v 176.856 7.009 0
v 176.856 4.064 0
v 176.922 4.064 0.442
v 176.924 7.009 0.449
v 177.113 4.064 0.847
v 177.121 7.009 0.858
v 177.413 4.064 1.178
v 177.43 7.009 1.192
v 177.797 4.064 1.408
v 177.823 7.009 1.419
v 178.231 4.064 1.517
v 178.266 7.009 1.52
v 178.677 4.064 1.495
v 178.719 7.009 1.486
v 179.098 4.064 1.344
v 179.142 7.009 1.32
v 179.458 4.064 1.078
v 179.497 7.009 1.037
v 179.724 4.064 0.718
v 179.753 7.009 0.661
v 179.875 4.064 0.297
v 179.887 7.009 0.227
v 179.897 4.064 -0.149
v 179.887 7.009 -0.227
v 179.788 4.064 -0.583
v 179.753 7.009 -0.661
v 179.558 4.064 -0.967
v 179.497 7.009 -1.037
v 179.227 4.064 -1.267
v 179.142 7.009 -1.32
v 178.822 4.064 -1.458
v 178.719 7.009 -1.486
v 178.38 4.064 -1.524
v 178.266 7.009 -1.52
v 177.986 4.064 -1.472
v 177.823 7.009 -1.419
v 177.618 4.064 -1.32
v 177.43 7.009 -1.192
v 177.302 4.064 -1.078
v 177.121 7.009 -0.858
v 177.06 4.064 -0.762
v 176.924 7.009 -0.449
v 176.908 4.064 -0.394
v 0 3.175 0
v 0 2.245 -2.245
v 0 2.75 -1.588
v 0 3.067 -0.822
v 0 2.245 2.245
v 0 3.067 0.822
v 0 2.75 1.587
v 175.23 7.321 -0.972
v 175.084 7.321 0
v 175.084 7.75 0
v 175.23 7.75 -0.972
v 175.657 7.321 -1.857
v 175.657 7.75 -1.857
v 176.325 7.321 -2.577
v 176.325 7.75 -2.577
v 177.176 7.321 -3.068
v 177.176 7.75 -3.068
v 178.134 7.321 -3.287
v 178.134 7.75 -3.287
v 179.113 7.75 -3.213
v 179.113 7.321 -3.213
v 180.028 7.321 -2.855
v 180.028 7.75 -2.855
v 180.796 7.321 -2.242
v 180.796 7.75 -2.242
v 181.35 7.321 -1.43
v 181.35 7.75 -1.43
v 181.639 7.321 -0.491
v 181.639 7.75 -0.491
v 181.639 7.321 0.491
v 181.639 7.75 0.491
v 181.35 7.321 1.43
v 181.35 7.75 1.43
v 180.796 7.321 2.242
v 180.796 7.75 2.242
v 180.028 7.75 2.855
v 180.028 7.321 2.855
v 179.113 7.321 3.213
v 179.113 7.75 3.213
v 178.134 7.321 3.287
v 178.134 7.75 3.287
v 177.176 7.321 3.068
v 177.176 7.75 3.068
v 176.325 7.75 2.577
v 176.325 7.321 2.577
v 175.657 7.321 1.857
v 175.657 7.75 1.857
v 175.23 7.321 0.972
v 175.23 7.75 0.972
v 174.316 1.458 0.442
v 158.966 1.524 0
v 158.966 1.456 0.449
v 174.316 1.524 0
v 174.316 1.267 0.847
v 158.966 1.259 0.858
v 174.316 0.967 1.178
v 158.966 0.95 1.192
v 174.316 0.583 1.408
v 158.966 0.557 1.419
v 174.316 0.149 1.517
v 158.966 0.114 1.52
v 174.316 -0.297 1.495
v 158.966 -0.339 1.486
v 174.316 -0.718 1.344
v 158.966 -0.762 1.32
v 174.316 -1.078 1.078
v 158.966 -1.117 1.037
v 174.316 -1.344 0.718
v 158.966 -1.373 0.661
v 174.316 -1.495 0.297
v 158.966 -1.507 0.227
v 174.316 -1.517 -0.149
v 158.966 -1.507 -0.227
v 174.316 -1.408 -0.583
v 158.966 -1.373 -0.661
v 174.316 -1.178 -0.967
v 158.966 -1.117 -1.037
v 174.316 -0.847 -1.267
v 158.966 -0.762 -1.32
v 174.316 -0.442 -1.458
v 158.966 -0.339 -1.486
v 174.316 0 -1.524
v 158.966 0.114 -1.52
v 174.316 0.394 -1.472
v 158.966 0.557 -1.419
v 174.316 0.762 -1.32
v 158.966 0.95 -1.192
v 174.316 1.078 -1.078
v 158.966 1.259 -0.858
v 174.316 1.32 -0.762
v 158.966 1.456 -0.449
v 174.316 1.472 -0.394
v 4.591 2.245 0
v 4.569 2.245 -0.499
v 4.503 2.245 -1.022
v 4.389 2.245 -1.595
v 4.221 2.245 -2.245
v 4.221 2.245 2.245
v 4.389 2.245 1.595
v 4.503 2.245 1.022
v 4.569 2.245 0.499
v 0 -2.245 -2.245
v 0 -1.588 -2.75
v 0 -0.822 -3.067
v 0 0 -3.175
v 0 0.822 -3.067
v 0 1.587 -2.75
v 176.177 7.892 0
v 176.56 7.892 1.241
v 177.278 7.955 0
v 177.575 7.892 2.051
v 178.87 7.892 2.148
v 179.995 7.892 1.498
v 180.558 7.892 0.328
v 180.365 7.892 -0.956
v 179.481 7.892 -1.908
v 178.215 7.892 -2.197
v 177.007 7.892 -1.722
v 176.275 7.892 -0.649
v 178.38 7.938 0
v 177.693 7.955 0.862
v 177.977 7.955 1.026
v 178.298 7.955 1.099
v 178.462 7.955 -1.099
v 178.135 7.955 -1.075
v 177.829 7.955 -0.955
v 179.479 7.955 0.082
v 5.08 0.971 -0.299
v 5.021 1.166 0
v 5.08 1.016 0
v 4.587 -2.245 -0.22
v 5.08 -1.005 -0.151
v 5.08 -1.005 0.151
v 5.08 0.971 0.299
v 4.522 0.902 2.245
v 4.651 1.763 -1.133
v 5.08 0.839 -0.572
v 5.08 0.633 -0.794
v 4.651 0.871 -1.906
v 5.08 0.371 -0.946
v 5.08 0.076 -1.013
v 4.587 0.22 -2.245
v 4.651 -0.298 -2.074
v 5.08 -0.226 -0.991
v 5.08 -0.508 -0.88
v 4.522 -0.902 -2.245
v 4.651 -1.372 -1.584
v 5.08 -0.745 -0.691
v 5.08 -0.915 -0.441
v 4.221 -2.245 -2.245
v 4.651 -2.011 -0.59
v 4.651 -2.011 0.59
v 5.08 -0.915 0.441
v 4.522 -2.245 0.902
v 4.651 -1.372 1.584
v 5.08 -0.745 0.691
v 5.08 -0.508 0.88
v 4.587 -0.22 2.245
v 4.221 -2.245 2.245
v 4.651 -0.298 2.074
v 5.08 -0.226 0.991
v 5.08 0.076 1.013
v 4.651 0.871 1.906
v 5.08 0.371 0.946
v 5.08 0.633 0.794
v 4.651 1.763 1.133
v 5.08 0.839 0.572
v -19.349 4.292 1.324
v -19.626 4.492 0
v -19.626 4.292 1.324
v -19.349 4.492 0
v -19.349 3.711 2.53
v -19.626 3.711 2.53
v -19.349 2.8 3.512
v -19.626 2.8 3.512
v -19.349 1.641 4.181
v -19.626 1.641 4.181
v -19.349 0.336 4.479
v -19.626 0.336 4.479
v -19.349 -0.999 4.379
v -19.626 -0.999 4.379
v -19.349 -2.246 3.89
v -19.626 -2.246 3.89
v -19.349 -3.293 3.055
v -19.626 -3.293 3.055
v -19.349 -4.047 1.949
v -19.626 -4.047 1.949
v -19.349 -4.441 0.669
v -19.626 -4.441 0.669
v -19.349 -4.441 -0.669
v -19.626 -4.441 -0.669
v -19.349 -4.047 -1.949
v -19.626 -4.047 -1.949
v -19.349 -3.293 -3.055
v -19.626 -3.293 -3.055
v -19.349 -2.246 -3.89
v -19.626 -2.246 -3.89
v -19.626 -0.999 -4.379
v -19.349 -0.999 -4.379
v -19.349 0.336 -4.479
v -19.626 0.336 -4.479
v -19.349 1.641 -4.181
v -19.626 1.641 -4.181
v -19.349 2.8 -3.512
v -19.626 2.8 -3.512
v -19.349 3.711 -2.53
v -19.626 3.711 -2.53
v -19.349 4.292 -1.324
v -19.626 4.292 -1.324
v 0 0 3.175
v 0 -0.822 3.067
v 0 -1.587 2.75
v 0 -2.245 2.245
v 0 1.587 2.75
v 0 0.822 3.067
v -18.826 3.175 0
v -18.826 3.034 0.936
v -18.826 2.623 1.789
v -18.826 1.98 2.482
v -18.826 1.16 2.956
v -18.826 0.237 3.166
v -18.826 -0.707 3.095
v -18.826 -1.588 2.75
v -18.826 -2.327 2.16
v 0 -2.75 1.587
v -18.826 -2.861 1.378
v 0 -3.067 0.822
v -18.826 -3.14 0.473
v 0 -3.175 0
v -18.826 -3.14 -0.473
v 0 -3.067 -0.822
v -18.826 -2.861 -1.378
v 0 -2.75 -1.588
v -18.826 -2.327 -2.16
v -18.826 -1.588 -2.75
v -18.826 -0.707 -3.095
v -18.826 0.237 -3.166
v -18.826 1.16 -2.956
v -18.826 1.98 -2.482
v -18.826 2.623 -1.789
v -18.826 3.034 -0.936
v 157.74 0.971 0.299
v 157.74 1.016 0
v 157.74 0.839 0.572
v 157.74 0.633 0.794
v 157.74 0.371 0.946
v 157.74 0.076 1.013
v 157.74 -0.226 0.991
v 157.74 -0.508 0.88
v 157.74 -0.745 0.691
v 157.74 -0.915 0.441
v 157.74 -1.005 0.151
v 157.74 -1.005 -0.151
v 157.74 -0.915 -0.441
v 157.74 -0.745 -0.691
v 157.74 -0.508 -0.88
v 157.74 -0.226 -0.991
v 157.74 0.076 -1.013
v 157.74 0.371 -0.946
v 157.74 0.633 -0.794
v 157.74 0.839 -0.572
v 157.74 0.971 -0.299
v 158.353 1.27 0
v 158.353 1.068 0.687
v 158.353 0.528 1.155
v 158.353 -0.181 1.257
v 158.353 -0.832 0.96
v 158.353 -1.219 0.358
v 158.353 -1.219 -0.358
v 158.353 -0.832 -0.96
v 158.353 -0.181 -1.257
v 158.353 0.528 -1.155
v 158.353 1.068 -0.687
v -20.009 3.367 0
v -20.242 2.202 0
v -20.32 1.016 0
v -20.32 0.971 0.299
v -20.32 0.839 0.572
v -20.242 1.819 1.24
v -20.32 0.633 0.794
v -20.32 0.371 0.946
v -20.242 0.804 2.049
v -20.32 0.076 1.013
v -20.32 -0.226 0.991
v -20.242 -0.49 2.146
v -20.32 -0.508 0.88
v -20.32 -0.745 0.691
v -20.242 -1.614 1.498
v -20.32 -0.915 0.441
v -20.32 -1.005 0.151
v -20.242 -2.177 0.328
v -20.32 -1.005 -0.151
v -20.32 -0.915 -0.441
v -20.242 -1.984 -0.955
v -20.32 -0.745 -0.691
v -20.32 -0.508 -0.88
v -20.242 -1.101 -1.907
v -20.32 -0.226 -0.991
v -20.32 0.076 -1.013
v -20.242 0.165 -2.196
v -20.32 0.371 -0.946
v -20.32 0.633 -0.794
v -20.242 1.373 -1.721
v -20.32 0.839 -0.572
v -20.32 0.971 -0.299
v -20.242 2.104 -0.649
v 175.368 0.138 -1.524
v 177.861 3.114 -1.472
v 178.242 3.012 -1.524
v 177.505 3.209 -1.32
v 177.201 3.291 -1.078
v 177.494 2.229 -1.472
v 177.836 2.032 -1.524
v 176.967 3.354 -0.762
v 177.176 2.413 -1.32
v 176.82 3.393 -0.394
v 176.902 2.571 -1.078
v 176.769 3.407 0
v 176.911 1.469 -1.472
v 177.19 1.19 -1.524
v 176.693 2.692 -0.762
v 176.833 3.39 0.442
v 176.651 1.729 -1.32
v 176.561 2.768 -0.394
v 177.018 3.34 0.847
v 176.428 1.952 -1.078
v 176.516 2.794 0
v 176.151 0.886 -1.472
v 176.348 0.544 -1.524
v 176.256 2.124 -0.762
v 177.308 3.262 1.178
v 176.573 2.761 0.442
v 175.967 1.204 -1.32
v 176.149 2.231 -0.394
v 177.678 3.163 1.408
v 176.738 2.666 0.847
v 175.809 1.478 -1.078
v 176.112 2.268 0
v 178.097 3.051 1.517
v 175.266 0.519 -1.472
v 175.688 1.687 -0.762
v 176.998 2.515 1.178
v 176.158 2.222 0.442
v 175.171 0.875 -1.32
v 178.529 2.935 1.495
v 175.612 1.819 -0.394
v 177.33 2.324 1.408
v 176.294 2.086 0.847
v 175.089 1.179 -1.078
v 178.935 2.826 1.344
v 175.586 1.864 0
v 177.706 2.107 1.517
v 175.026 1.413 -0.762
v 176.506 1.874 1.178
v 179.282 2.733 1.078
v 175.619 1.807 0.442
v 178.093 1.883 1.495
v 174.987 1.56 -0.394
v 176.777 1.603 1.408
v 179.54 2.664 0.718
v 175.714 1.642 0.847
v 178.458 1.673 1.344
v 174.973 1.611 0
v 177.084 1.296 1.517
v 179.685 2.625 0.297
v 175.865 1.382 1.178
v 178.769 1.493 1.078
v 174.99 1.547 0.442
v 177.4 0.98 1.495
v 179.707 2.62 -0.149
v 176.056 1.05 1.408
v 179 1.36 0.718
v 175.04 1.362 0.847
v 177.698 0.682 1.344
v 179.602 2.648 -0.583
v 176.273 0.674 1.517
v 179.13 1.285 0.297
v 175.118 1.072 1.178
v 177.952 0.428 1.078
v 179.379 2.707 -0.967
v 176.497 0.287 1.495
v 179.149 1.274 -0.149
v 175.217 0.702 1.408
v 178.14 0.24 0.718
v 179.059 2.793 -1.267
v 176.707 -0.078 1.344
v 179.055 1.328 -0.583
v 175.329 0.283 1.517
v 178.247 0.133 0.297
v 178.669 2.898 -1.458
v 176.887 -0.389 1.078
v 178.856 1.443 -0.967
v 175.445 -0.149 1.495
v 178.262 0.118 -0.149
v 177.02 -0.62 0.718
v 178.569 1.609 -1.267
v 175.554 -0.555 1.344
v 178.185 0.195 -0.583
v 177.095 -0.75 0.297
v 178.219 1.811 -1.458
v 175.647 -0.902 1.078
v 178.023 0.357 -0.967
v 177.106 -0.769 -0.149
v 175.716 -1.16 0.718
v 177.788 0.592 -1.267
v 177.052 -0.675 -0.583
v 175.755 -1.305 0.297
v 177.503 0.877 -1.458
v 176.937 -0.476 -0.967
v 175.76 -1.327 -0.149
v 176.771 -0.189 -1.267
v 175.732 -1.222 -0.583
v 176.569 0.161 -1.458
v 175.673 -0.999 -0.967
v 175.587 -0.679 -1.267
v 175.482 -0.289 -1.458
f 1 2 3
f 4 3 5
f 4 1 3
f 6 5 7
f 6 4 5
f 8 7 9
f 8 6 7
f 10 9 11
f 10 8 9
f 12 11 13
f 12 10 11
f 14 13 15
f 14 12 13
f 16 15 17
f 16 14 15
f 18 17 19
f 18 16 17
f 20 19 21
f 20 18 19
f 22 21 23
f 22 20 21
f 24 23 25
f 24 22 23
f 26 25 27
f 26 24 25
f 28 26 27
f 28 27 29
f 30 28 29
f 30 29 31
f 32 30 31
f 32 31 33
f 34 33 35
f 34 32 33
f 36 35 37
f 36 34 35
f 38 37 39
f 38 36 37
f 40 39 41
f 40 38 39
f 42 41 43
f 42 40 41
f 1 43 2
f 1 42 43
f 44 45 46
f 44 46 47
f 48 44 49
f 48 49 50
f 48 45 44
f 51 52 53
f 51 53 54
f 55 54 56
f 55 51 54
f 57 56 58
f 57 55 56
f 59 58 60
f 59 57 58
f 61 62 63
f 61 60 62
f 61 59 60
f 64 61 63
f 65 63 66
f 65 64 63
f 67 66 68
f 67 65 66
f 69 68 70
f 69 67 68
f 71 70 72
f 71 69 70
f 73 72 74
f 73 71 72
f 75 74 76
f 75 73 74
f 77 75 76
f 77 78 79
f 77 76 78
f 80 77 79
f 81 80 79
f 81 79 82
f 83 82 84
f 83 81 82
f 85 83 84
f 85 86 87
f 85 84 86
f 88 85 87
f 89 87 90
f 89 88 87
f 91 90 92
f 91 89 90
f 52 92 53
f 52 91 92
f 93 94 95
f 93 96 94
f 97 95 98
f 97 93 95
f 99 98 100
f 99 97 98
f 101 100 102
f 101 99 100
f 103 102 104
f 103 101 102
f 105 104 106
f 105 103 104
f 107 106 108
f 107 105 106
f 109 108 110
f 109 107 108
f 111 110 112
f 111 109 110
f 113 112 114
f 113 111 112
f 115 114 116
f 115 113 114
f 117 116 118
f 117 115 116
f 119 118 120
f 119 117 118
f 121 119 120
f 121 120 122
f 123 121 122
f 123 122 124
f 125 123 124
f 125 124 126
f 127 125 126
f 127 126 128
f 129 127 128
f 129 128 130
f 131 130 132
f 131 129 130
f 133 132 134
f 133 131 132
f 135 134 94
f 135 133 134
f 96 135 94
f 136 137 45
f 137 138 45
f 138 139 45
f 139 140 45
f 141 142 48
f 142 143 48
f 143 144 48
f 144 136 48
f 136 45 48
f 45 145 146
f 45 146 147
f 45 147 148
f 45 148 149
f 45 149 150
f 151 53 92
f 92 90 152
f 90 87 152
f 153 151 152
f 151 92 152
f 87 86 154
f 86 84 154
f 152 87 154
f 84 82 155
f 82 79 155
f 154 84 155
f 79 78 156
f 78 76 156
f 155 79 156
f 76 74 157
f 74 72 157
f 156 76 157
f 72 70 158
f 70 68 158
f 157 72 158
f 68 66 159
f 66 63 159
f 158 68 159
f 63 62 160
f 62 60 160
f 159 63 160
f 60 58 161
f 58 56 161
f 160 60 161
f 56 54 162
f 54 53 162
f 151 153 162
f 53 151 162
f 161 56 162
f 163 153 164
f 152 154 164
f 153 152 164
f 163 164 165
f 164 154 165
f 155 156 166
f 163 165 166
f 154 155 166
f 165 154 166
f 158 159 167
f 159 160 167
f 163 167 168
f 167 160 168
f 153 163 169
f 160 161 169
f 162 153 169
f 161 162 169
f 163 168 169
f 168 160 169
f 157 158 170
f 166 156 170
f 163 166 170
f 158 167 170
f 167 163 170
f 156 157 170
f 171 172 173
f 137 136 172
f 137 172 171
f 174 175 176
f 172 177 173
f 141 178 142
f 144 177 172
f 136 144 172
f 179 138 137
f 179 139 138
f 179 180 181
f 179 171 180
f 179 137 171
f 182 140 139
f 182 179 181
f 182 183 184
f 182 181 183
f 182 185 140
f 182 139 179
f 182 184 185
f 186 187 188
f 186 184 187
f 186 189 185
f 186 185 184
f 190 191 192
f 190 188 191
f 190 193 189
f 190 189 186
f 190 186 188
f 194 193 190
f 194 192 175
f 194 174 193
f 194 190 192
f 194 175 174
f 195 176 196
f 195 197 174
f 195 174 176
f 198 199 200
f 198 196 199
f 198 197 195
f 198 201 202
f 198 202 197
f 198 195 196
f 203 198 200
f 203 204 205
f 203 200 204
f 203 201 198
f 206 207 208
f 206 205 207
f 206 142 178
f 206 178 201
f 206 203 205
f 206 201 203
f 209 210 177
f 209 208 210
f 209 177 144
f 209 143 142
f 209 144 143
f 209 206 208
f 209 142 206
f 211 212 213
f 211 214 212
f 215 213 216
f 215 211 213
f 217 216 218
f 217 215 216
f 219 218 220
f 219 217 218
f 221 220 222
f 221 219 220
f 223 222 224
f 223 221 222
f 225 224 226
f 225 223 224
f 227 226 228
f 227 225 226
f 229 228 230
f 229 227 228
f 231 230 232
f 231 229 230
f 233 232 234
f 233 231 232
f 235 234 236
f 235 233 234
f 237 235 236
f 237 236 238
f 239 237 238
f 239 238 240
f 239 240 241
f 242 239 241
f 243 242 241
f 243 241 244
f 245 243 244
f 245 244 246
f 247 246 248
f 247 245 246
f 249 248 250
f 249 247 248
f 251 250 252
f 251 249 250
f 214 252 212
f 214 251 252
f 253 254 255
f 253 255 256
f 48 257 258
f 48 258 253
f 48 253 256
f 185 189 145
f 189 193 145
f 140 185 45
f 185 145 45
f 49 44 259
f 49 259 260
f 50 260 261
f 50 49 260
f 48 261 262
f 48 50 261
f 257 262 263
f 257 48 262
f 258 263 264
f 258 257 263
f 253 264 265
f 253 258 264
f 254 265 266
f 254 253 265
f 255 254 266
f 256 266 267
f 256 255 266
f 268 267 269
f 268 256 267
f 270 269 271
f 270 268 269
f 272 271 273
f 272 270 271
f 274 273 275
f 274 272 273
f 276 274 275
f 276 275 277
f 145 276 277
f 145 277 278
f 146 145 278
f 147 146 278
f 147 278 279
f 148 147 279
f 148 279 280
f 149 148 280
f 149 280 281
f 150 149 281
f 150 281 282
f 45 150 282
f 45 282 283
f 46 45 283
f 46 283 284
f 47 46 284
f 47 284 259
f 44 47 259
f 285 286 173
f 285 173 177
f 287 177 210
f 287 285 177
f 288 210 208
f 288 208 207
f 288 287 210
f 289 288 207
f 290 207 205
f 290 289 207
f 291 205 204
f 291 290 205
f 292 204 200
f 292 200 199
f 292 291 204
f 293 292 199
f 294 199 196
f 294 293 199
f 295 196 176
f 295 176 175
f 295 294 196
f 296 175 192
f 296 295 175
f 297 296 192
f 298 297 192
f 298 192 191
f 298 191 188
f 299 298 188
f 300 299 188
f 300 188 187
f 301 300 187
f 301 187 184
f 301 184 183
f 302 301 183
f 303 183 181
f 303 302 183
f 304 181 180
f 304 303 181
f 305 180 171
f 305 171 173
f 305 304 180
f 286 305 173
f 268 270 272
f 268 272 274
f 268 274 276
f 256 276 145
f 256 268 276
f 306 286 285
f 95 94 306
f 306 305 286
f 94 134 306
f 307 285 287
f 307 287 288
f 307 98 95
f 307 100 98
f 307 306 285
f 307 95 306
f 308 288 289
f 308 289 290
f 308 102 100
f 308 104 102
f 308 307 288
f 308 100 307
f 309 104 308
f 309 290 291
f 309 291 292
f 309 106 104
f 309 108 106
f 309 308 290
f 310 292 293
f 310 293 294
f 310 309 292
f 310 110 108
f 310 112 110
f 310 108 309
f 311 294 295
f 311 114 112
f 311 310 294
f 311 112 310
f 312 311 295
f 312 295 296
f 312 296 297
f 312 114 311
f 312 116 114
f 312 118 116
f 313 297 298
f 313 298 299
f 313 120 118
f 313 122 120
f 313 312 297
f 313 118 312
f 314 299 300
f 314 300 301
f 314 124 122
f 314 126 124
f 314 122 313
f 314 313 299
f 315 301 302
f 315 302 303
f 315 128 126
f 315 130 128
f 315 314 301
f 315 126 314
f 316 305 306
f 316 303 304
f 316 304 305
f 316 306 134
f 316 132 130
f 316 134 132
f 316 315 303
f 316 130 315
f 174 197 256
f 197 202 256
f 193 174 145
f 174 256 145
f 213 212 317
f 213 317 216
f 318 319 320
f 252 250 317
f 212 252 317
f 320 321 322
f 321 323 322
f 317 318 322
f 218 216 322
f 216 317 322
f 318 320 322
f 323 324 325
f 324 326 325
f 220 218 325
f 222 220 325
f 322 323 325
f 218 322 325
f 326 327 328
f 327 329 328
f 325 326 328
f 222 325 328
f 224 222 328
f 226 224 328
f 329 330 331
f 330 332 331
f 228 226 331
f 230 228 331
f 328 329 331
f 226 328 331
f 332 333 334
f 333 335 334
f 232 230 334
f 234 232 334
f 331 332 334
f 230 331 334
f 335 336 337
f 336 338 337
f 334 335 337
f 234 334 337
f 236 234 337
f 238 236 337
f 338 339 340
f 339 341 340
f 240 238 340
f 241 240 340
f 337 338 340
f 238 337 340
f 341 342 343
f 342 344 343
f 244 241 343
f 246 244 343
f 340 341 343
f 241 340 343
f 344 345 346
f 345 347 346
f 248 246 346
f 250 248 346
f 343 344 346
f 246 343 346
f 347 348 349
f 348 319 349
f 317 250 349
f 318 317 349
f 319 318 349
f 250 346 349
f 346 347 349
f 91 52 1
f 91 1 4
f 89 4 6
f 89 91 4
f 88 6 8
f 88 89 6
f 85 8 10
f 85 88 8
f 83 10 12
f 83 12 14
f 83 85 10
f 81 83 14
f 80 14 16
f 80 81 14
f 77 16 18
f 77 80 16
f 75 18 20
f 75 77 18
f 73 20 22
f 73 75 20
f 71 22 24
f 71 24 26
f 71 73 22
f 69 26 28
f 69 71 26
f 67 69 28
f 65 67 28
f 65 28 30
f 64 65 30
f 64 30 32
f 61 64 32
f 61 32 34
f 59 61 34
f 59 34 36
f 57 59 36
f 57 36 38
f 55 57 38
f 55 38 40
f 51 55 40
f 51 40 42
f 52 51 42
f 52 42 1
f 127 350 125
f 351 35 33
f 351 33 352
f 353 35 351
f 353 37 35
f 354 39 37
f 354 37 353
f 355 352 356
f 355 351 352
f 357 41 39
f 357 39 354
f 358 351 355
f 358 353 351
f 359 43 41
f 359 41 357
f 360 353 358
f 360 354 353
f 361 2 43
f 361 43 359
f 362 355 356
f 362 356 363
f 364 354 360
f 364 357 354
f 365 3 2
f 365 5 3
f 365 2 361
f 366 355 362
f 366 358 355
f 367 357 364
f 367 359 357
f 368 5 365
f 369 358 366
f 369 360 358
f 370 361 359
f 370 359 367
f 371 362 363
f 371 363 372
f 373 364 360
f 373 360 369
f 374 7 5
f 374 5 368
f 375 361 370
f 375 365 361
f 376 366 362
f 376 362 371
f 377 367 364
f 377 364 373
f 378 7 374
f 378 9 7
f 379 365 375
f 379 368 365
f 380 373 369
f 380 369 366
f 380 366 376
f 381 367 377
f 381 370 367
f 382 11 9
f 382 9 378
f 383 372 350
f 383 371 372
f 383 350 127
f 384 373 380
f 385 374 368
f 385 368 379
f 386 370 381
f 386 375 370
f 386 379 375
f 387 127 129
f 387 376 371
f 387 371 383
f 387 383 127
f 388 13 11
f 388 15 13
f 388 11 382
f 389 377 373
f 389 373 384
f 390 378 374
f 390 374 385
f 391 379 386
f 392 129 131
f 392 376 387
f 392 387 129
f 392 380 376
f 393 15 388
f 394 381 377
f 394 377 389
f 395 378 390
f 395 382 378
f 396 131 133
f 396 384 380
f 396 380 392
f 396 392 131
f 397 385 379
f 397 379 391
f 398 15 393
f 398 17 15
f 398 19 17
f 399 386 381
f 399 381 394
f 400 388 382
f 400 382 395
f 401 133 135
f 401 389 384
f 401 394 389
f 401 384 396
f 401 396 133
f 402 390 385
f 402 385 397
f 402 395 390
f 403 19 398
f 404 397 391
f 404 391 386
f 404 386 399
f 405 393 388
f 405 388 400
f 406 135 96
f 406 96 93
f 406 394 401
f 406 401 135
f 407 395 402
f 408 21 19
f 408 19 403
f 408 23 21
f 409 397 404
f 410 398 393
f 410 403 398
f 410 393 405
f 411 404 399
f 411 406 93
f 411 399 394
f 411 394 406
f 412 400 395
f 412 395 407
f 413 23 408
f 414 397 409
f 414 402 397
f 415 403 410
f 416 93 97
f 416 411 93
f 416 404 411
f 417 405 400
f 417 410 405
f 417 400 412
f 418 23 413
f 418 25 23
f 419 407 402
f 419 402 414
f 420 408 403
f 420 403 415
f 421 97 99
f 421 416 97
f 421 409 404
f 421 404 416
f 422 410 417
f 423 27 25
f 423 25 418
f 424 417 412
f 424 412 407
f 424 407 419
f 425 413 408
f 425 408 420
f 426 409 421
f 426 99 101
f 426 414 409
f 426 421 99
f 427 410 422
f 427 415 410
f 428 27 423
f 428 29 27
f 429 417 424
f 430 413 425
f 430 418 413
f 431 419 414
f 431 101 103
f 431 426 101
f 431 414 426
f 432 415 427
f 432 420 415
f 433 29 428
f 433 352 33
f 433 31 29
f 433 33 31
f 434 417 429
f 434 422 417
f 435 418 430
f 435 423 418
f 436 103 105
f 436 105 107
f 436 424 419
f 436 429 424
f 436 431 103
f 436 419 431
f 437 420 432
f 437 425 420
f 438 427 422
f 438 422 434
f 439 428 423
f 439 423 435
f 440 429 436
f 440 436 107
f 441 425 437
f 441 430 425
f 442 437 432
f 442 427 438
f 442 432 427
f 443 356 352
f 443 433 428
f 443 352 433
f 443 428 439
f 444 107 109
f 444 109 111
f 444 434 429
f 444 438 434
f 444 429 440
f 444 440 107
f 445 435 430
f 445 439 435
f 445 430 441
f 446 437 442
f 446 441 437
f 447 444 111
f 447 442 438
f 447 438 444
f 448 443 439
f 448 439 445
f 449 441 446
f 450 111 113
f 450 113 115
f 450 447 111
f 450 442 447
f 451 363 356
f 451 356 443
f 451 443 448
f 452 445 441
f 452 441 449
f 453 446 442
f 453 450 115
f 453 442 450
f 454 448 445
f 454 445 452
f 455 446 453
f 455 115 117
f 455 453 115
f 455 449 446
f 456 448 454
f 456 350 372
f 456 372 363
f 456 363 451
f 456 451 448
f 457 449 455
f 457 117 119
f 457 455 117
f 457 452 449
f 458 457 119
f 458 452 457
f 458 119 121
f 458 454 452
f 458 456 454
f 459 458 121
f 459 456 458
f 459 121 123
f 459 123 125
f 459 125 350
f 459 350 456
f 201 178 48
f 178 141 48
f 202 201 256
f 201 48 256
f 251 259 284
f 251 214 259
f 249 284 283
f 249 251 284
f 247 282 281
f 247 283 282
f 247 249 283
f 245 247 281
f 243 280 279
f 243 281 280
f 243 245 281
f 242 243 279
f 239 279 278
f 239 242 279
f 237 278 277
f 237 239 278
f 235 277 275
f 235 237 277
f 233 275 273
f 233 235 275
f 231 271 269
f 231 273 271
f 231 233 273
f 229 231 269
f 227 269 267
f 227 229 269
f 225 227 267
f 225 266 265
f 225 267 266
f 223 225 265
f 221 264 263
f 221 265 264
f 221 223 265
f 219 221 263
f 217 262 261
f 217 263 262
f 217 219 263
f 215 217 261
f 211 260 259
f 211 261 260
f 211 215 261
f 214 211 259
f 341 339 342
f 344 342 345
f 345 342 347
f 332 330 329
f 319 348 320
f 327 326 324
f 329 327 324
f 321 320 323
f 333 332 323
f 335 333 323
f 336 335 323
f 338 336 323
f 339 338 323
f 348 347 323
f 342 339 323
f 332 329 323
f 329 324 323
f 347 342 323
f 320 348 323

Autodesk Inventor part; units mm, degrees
ref_plane "YZ Plane" through (0, 0, 0) normal (1, 0, 0) x (0, 1, 0)
ref_plane "XZ Plane" through (0, 0, 0) normal (0, 1, 0) x (-1, 0, 0)
ref_plane "XY Plane" through (0, 0, 0) normal (0, 0, 1) x (1, 0, 0)
sketch "Sketch1" plane through (0, 0, 0) normal (0, 0, 1) x (1, 0, 0)
  line L0 (-20.32, 1.016) -> (157.7405, 1.016)
  line L1 (-20.32, 1.016) -> (-20.32, 0)
  line L2 (-20.32, 0) -> (174.316, 0)
  line L3 (157.7405, 1.016) -> (158.9661, 1.524)
  line L4 (158.9661, 1.524) -> (174.316, 1.524)
  line L5 (174.316, 1.524) -> (174.316, 0)
  arc A0 (174.316, 1.524) -> (176.856, 4.064) centre (174.316, 4.064) ccw
  line L6 (176.856, 4.064) -> (176.856, 7.009)
  arc A1 (178.38, 7.9375) -> (175.0839, 7.75) centre (177.5921, -7.2764) ccw
  line L7 (176.856, 4.064) -> (179.904, 4.064)
  line L8 (178.38, 4.064) -> (178.38, 7.9375)
  arc A2 (174.316, 0) -> (178.38, 4.064) centre (174.316, 4.064) ccw
  line L9 (175.0839, 7.75) -> (175.0839, 7.3209)
  line L10 (175.0839, 7.3209) -> (176.856, 7.009)
  arc A3 (-19.626, 4.4916) -> (-20.32, 1.016) centre (-11.2701, 1.016) ccw
  line L11 (-19.626, 4.4916) -> (-19.3494, 4.4916)
  line L12 (-19.3494, 4.4916) -> (-18.8257, 3.175)
  line L13 (0, 3.175) -> (4.2213, 3.175)
  line L14 (4.2213, 3.175) -> (5.08, 1.016)
  line L15 (5.08, 1.016) -> (5.08, 0)
  line L16 (0, 3.175) -> (0, 0)
  line L17 (-18.8257, 3.175) -> (0, 3.175)
  line L18 (0, 0) -> (5.08, 0)
  dimension "d1" = 2.032
  dimension "d2" = 3.048
  dimension "d5" = 6.35
  dimension "d11" = 9.0499
  dimension "d12" = 25.4
  dimension "d13" = 5.08
  dimension "d14" = 0.2766
  dimension "d15" = 1.4943
  dimension "d16" = 1.2255
  dimension "d17" = 2.54
  dimension "d18" = 7.9375
  dimension "d19" = 15.2343
  dimension "d20" = 6.5922
  dimension "d21" = 198.7
revolve "Revolution1" add sketch "Sketch1" angle 360 about axis through (-20.32, 0, 0) along (1, 0, 0) contours L15 L2 L16 L0 | L0 L16 L13 L14 | L0 L3 L4 L5 L2 L15 | L16 L2 L1 L0 | L0 A3 L11 L12 L17 L16
sketch "Sketch3" plane through (0, 0, 0) normal (1, 0, 0) x (0, 1, 0)
  circle A0 centre (0, 0) radius 3.175 projected
  line L0 (2.2451, 2.2451) -> (-2.2451, 2.2451)
  line L1 (-2.2451, 2.2451) -> (-2.2451, -2.2451)
  line L2 (-2.2451, -2.2451) -> (2.2451, -2.2451)
  line L3 (2.2451, -2.2451) -> (2.2451, 2.2451)
  point P0 (-0.0045, 0)
extrude "Extrusion1" cut sketch "Sketch3" along normal blind 7.9502 contours A0 L3 | L0 A0 | A0 L2 | L1 A0
revolve "Revolution2" add sketch "Sketch1" angle 360 about axis through (178.38, 4.064, 0) along (0, 1, 0) contours L7 L6 L10 L9 A1 L8
sketch "Sketch2" plane through (174.316, 0, 0) normal (1, 0, 0) x (0, 0, -1)
  circle A0 centre (0, 0) radius 1.524 projected
  line L0 (0, 4.064) -> (3.1623, 4.064)
revolve "Revolution3" add sketch "Sketch2" angle 90 about axis through (174.316, 4.064, 0) along (0, 0, 1)
properties part number "SpokeRear"
